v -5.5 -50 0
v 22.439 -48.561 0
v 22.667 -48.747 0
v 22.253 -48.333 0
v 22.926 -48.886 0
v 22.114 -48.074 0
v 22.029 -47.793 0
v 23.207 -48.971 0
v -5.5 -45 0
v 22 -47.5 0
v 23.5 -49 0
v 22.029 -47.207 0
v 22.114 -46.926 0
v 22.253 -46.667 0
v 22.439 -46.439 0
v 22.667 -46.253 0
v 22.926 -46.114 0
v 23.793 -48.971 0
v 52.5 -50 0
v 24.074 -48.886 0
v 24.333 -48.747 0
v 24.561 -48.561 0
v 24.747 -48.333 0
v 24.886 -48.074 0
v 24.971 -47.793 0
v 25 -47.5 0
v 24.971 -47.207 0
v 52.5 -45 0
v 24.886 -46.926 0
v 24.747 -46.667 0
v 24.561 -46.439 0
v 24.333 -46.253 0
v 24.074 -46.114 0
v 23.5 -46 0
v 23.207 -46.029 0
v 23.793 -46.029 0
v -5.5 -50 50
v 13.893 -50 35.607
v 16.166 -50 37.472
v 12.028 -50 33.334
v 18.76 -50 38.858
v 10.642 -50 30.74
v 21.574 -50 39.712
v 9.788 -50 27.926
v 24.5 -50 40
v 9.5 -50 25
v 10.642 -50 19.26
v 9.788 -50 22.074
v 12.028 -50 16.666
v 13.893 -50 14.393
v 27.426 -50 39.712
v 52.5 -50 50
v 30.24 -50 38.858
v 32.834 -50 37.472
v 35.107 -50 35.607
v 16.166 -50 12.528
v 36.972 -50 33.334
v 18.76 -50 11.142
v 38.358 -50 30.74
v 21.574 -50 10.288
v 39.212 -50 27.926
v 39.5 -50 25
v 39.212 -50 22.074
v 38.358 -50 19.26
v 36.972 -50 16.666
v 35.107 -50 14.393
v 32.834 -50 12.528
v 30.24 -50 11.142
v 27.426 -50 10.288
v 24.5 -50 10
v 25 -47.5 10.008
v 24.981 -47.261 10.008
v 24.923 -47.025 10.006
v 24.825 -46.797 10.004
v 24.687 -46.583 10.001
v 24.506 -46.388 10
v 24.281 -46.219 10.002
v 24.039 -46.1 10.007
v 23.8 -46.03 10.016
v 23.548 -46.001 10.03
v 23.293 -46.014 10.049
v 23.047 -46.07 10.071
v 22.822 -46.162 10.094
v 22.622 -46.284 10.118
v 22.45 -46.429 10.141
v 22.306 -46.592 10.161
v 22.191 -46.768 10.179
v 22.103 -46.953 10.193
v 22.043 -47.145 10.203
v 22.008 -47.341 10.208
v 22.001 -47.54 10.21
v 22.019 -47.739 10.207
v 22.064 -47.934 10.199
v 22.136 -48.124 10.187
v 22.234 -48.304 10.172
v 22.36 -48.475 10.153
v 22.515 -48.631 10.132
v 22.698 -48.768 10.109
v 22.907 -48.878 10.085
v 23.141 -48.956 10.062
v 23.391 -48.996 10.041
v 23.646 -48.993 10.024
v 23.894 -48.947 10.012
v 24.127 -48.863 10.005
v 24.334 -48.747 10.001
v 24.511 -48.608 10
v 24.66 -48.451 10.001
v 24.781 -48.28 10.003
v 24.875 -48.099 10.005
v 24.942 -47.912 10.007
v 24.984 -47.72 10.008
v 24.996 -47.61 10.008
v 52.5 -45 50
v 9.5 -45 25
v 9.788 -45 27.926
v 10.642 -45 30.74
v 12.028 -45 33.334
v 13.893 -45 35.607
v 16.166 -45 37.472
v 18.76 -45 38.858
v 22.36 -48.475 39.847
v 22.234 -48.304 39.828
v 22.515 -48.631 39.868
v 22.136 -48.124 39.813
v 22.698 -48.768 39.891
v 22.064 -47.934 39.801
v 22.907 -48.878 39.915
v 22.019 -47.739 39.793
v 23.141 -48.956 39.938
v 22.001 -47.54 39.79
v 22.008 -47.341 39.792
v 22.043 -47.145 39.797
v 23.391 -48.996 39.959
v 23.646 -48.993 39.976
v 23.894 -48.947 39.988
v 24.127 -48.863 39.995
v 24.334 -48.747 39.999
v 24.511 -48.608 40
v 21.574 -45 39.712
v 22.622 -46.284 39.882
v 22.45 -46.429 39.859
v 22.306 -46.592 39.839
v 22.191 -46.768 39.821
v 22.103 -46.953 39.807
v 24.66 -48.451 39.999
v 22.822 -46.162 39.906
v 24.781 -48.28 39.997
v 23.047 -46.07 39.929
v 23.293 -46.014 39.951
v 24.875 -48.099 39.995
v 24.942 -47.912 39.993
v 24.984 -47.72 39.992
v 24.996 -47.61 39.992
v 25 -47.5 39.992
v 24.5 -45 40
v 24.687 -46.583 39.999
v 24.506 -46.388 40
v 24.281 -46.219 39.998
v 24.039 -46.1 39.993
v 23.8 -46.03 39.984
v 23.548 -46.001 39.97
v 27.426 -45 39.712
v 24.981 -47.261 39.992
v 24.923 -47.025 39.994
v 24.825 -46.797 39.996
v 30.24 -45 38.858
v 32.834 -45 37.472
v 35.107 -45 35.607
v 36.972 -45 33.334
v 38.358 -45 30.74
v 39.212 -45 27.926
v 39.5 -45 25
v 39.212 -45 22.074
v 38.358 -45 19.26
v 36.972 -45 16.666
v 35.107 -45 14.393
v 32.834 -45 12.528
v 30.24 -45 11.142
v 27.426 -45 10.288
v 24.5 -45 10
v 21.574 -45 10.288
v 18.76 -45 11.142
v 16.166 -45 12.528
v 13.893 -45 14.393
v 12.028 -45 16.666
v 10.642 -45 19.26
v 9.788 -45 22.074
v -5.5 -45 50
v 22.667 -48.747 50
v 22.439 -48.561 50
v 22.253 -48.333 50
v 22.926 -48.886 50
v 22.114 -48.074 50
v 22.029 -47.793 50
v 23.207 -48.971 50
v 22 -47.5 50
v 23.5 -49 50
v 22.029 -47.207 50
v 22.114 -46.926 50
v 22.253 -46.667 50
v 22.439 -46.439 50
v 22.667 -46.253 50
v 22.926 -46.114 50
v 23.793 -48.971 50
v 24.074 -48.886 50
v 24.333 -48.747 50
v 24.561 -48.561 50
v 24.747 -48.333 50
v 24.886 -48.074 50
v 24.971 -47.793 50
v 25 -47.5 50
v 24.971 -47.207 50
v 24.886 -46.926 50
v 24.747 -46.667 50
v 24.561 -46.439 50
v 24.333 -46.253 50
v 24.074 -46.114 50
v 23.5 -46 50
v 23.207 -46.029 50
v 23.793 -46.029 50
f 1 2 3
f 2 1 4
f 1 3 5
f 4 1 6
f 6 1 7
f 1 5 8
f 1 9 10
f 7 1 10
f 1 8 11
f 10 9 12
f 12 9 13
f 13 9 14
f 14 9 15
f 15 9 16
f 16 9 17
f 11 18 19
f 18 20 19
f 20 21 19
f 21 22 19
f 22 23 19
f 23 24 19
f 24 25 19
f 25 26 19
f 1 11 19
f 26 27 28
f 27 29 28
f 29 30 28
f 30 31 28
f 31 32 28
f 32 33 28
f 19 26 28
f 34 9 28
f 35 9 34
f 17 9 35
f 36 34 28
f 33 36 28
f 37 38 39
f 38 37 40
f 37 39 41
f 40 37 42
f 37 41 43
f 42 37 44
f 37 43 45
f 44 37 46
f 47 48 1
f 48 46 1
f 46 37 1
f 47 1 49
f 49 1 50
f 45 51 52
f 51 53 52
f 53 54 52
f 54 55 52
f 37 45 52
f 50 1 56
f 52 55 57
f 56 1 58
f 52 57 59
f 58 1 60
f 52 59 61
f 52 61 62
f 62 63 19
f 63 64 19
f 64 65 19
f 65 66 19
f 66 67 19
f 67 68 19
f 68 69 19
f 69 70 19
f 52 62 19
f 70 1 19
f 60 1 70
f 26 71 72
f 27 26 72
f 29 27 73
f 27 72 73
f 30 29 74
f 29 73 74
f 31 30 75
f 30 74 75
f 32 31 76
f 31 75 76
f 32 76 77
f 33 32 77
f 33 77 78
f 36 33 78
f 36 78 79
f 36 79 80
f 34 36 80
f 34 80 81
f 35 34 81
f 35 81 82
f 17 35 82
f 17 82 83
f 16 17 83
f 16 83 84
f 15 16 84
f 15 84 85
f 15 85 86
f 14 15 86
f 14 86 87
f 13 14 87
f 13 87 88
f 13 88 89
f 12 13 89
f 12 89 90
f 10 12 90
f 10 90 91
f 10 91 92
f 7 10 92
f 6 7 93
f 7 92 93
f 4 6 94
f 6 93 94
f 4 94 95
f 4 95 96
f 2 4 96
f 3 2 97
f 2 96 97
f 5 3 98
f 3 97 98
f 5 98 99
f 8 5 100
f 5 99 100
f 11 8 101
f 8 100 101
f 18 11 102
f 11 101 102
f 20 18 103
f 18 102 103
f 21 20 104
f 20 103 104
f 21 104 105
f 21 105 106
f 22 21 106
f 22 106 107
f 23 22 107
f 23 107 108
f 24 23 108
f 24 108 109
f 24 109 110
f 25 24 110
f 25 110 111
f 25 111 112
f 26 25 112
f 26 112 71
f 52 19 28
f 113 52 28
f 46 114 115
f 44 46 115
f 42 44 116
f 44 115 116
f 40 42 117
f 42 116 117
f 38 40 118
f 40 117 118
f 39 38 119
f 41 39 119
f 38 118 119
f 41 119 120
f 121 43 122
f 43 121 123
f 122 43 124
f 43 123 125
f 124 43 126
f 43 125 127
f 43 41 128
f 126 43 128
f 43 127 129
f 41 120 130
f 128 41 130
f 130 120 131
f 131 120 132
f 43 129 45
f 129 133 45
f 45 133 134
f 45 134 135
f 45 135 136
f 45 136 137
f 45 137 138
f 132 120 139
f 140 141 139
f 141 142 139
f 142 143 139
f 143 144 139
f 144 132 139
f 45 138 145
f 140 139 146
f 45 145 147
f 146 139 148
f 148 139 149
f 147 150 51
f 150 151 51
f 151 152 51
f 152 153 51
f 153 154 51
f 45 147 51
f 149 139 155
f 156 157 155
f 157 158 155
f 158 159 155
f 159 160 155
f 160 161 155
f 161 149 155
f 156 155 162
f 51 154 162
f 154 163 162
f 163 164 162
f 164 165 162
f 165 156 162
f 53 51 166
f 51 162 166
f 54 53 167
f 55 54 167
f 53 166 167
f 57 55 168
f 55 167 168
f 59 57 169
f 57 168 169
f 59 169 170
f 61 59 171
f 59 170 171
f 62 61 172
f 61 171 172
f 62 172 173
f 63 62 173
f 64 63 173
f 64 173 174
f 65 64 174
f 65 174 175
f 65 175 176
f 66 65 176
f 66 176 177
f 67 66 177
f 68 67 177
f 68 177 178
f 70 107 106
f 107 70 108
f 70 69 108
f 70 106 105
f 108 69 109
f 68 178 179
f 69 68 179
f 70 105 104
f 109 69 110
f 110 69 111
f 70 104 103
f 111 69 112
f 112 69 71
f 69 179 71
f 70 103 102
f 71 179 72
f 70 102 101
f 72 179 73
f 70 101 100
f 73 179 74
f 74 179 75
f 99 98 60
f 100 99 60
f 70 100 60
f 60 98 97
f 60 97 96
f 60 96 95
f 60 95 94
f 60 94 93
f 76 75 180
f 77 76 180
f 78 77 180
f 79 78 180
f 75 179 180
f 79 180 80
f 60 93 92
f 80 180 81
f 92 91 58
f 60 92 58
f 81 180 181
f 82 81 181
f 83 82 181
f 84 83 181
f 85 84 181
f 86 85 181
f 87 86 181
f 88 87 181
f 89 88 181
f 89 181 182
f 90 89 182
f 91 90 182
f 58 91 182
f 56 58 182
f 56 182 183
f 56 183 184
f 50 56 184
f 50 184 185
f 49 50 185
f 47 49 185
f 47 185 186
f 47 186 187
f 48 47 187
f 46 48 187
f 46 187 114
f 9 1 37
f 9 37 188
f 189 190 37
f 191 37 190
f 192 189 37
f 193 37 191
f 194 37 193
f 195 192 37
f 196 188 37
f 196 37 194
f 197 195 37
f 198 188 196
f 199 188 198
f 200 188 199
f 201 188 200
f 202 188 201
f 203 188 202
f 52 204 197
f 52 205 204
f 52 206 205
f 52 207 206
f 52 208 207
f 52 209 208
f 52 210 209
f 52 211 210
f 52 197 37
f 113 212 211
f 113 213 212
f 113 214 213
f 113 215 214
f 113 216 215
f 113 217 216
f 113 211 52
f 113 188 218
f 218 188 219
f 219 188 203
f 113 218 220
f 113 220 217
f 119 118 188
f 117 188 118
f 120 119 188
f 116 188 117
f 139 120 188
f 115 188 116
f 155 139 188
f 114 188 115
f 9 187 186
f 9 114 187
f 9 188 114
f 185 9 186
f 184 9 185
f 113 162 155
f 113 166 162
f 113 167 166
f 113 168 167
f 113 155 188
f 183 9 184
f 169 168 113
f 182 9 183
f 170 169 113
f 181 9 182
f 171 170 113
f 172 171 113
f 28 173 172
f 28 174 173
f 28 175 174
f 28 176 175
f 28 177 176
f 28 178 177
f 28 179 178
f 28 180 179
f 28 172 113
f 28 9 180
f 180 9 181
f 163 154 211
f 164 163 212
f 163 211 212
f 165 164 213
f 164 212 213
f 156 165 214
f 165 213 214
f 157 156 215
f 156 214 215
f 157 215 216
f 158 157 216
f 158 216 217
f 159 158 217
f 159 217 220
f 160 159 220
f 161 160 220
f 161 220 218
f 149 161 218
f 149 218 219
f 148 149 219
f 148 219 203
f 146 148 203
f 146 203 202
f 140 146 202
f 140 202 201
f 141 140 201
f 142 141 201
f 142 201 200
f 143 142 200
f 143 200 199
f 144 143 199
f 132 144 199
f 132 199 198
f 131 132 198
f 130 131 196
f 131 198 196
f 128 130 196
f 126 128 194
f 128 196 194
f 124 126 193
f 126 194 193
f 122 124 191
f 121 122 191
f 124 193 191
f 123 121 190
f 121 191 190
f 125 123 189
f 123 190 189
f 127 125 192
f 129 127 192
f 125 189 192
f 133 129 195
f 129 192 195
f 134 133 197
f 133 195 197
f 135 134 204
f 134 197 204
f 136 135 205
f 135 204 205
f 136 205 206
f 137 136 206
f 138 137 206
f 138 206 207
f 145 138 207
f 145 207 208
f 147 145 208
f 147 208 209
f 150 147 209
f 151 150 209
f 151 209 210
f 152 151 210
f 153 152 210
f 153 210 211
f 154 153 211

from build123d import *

# Parameters (mm, degrees)
ESQUISSE1_W             = 58
ESQUISSE1_H             = 5
BOSS_EXTRU_1_DEPTH      = 50
ESQUISSE2_R             = 15
ENL_V_MAT_EXTRU_1_DEPTH = 6
ESQUISSE5_R             = 1.5
ENL_V_MAT_EXTRU_4_DEPTH = 51


with BuildPart() as part:
    # Esquisse1 → Boss.-Extru.1 (new body)
    with BuildSketch(Plane.XY):
        with Locations((23.5, -47.5)):
            Rectangle(ESQUISSE1_W, ESQUISSE1_H)
    extrude(amount=BOSS_EXTRU_1_DEPTH)

    # Esquisse2 → Enlèv. mat.-Extru.1 (cut, through all)
    with BuildSketch(Plane(origin=(0, -45, 0), x_dir=(-1, 0, 0), z_dir=(0, 1, 0))):
        with Locations((-24.5, 25)):
            Circle(ESQUISSE2_R)
    extrude(amount=-ENL_V_MAT_EXTRU_1_DEPTH, mode=Mode.SUBTRACT)

    # Esquisse5 → Enlèv. mat.-Extru.4 (cut, through all)
    with BuildSketch(Plane.XY.offset(50)):
        with Locations((23.5, -47.5)):
            Circle(ESQUISSE5_R)
    extrude(amount=-ENL_V_MAT_EXTRU_4_DEPTH, mode=Mode.SUBTRACT)


solid = part.part
